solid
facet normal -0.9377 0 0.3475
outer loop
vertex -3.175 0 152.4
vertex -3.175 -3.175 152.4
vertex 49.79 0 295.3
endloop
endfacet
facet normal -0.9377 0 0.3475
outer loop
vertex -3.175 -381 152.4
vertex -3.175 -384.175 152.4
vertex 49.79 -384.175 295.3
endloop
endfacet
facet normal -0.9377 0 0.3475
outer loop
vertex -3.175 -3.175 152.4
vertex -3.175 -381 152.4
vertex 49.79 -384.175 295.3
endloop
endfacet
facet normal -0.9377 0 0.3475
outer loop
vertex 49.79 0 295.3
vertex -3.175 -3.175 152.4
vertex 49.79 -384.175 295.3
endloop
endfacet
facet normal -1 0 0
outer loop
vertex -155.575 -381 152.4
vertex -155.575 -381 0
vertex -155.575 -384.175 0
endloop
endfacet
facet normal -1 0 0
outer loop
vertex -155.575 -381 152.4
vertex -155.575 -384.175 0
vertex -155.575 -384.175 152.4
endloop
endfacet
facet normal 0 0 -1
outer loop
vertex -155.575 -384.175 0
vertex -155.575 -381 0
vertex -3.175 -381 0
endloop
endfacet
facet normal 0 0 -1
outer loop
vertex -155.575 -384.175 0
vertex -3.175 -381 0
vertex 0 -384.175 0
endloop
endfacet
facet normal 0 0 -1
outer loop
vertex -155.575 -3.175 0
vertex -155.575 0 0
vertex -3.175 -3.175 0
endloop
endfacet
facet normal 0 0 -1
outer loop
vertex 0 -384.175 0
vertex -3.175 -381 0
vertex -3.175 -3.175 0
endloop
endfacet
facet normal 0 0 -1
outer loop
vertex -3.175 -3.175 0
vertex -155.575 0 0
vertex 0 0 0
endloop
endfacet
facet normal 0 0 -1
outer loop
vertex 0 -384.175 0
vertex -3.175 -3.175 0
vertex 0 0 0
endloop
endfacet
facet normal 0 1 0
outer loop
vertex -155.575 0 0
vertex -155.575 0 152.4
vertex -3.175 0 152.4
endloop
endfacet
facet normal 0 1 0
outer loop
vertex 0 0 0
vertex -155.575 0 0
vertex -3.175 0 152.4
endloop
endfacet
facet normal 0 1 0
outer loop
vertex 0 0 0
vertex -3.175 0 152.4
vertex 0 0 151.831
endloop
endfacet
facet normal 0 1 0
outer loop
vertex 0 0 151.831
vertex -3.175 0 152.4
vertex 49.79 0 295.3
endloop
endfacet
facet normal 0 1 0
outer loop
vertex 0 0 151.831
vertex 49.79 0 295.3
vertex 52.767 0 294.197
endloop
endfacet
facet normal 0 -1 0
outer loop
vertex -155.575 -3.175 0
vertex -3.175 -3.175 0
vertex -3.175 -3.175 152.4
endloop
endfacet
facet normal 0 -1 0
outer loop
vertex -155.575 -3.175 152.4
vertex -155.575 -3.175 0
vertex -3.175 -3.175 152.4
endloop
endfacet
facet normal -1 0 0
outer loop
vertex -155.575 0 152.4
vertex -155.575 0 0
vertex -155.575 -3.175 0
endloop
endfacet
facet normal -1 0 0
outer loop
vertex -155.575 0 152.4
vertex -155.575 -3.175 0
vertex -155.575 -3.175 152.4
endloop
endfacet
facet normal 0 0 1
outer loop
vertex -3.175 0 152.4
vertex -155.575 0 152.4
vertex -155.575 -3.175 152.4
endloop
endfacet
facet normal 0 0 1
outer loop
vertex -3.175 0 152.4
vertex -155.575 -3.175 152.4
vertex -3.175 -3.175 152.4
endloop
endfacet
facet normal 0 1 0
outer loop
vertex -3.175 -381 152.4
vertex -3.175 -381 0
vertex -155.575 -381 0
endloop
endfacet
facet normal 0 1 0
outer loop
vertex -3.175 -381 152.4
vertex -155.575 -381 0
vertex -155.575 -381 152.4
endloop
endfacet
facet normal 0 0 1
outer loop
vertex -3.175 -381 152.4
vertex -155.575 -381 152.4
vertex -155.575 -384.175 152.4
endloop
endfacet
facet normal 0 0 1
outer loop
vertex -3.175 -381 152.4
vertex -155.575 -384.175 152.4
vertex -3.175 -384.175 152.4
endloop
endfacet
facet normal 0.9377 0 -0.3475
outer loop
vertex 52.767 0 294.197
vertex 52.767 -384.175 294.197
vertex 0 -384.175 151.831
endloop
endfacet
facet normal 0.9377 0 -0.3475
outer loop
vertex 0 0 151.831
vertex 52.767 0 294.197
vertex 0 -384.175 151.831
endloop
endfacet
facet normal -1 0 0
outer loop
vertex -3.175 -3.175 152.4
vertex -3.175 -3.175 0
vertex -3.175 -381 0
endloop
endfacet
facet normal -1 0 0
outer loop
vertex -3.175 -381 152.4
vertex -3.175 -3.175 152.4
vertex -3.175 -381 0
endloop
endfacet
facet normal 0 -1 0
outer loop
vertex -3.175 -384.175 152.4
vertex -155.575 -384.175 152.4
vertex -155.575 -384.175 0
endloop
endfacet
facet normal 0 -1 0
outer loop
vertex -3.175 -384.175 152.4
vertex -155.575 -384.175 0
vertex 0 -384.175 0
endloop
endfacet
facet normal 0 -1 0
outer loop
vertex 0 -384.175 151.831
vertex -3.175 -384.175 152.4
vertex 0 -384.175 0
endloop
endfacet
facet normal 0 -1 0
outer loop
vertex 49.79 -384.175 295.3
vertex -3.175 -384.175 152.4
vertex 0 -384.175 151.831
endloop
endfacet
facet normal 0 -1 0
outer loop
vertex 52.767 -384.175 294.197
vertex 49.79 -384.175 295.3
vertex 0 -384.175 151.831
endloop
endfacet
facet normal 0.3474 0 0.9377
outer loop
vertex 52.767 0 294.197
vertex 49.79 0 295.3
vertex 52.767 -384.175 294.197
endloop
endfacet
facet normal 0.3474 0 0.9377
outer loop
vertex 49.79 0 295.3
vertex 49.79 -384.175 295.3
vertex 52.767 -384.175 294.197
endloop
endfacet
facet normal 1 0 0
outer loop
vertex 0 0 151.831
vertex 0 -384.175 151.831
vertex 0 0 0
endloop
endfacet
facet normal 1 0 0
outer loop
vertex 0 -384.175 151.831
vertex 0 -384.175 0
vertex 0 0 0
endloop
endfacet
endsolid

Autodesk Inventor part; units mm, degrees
ref_plane "YZ Plane" through (0, 0, 0) normal (1, 0, 0) x (0, 1, 0)
ref_plane "XZ Plane" through (0, 0, 0) normal (0, 1, 0) x (-1, 0, 0)
ref_plane "XY Plane" through (0, 0, 0) normal (0, 0, 1) x (1, 0, 0)
sketch "Sketch1" plane through (0, 0, 0) normal (0, 0, 1) x (1, 0, 0)
  line L0 (0, 0) -> (-3.175, 0)
  line L1 (-3.175, 0) -> (-3.175, -384.175)
  line L2 (-3.175, -384.175) -> (0, -384.175)
  line L3 (0, -384.175) -> (0, 0)
  dimension "d0" = 3.175
  dimension "d1" = 384.175
extrude "Extrusion1" add sketch "Sketch1" along normal blind 152.4
sketch "Sketch2" plane through (-3.175, -384.175, 0) normal (-1, 0, 0) x (0, 0, 1)
  line L0 (0, 384.175) -> (0, 0) projected
  line L1 (152.4, 384.175) -> (0, 384.175)
  line L2 (0, 384.175) -> (0, 381)
  line L3 (0, 381) -> (152.4, 381)
  line L4 (152.4, 381) -> (152.4, 384.175)
  line L5 (0, 384.175) -> (152.4, 384.175) projected
  line L6 (152.4, 384.175) -> (152.4, 0) projected
  line L7 (152.4, 0) -> (0, 0)
  line L8 (0, 0) -> (0, 3.175)
  line L9 (0, 3.175) -> (152.4, 3.175)
  line L10 (152.4, 3.175) -> (152.4, 0)
  dimension "d4" = 152.4
  dimension "d5" = 3.175
  dimension "d6" = 3.175
extrude "Extrusion2" add sketch "Sketch2" along normal blind 152.4 contours L1 L4 L3 L0 | L9 L6 L7 L0
sketch "Sketch3" plane through (0, -384.175, 0) normal (0, -1, 0) x (1, 0, 0)
  line L0 (-3.175, 152.4) -> (49.7899, 295.3003)
  line L1 (49.7899, 295.3003) -> (52.767, 294.1968)
  line L2 (52.767, 294.1968) -> (-0.1979, 151.2966)
  line L3 (-0.1979, 151.2966) -> (-3.175, 152.4)
  point P0 (0, 0)
  dimension "d9" = 3.175
  dimension "d10" = 152.4
extrude "Extrusion3" add sketch "Sketch3" against normal blind 384.175
